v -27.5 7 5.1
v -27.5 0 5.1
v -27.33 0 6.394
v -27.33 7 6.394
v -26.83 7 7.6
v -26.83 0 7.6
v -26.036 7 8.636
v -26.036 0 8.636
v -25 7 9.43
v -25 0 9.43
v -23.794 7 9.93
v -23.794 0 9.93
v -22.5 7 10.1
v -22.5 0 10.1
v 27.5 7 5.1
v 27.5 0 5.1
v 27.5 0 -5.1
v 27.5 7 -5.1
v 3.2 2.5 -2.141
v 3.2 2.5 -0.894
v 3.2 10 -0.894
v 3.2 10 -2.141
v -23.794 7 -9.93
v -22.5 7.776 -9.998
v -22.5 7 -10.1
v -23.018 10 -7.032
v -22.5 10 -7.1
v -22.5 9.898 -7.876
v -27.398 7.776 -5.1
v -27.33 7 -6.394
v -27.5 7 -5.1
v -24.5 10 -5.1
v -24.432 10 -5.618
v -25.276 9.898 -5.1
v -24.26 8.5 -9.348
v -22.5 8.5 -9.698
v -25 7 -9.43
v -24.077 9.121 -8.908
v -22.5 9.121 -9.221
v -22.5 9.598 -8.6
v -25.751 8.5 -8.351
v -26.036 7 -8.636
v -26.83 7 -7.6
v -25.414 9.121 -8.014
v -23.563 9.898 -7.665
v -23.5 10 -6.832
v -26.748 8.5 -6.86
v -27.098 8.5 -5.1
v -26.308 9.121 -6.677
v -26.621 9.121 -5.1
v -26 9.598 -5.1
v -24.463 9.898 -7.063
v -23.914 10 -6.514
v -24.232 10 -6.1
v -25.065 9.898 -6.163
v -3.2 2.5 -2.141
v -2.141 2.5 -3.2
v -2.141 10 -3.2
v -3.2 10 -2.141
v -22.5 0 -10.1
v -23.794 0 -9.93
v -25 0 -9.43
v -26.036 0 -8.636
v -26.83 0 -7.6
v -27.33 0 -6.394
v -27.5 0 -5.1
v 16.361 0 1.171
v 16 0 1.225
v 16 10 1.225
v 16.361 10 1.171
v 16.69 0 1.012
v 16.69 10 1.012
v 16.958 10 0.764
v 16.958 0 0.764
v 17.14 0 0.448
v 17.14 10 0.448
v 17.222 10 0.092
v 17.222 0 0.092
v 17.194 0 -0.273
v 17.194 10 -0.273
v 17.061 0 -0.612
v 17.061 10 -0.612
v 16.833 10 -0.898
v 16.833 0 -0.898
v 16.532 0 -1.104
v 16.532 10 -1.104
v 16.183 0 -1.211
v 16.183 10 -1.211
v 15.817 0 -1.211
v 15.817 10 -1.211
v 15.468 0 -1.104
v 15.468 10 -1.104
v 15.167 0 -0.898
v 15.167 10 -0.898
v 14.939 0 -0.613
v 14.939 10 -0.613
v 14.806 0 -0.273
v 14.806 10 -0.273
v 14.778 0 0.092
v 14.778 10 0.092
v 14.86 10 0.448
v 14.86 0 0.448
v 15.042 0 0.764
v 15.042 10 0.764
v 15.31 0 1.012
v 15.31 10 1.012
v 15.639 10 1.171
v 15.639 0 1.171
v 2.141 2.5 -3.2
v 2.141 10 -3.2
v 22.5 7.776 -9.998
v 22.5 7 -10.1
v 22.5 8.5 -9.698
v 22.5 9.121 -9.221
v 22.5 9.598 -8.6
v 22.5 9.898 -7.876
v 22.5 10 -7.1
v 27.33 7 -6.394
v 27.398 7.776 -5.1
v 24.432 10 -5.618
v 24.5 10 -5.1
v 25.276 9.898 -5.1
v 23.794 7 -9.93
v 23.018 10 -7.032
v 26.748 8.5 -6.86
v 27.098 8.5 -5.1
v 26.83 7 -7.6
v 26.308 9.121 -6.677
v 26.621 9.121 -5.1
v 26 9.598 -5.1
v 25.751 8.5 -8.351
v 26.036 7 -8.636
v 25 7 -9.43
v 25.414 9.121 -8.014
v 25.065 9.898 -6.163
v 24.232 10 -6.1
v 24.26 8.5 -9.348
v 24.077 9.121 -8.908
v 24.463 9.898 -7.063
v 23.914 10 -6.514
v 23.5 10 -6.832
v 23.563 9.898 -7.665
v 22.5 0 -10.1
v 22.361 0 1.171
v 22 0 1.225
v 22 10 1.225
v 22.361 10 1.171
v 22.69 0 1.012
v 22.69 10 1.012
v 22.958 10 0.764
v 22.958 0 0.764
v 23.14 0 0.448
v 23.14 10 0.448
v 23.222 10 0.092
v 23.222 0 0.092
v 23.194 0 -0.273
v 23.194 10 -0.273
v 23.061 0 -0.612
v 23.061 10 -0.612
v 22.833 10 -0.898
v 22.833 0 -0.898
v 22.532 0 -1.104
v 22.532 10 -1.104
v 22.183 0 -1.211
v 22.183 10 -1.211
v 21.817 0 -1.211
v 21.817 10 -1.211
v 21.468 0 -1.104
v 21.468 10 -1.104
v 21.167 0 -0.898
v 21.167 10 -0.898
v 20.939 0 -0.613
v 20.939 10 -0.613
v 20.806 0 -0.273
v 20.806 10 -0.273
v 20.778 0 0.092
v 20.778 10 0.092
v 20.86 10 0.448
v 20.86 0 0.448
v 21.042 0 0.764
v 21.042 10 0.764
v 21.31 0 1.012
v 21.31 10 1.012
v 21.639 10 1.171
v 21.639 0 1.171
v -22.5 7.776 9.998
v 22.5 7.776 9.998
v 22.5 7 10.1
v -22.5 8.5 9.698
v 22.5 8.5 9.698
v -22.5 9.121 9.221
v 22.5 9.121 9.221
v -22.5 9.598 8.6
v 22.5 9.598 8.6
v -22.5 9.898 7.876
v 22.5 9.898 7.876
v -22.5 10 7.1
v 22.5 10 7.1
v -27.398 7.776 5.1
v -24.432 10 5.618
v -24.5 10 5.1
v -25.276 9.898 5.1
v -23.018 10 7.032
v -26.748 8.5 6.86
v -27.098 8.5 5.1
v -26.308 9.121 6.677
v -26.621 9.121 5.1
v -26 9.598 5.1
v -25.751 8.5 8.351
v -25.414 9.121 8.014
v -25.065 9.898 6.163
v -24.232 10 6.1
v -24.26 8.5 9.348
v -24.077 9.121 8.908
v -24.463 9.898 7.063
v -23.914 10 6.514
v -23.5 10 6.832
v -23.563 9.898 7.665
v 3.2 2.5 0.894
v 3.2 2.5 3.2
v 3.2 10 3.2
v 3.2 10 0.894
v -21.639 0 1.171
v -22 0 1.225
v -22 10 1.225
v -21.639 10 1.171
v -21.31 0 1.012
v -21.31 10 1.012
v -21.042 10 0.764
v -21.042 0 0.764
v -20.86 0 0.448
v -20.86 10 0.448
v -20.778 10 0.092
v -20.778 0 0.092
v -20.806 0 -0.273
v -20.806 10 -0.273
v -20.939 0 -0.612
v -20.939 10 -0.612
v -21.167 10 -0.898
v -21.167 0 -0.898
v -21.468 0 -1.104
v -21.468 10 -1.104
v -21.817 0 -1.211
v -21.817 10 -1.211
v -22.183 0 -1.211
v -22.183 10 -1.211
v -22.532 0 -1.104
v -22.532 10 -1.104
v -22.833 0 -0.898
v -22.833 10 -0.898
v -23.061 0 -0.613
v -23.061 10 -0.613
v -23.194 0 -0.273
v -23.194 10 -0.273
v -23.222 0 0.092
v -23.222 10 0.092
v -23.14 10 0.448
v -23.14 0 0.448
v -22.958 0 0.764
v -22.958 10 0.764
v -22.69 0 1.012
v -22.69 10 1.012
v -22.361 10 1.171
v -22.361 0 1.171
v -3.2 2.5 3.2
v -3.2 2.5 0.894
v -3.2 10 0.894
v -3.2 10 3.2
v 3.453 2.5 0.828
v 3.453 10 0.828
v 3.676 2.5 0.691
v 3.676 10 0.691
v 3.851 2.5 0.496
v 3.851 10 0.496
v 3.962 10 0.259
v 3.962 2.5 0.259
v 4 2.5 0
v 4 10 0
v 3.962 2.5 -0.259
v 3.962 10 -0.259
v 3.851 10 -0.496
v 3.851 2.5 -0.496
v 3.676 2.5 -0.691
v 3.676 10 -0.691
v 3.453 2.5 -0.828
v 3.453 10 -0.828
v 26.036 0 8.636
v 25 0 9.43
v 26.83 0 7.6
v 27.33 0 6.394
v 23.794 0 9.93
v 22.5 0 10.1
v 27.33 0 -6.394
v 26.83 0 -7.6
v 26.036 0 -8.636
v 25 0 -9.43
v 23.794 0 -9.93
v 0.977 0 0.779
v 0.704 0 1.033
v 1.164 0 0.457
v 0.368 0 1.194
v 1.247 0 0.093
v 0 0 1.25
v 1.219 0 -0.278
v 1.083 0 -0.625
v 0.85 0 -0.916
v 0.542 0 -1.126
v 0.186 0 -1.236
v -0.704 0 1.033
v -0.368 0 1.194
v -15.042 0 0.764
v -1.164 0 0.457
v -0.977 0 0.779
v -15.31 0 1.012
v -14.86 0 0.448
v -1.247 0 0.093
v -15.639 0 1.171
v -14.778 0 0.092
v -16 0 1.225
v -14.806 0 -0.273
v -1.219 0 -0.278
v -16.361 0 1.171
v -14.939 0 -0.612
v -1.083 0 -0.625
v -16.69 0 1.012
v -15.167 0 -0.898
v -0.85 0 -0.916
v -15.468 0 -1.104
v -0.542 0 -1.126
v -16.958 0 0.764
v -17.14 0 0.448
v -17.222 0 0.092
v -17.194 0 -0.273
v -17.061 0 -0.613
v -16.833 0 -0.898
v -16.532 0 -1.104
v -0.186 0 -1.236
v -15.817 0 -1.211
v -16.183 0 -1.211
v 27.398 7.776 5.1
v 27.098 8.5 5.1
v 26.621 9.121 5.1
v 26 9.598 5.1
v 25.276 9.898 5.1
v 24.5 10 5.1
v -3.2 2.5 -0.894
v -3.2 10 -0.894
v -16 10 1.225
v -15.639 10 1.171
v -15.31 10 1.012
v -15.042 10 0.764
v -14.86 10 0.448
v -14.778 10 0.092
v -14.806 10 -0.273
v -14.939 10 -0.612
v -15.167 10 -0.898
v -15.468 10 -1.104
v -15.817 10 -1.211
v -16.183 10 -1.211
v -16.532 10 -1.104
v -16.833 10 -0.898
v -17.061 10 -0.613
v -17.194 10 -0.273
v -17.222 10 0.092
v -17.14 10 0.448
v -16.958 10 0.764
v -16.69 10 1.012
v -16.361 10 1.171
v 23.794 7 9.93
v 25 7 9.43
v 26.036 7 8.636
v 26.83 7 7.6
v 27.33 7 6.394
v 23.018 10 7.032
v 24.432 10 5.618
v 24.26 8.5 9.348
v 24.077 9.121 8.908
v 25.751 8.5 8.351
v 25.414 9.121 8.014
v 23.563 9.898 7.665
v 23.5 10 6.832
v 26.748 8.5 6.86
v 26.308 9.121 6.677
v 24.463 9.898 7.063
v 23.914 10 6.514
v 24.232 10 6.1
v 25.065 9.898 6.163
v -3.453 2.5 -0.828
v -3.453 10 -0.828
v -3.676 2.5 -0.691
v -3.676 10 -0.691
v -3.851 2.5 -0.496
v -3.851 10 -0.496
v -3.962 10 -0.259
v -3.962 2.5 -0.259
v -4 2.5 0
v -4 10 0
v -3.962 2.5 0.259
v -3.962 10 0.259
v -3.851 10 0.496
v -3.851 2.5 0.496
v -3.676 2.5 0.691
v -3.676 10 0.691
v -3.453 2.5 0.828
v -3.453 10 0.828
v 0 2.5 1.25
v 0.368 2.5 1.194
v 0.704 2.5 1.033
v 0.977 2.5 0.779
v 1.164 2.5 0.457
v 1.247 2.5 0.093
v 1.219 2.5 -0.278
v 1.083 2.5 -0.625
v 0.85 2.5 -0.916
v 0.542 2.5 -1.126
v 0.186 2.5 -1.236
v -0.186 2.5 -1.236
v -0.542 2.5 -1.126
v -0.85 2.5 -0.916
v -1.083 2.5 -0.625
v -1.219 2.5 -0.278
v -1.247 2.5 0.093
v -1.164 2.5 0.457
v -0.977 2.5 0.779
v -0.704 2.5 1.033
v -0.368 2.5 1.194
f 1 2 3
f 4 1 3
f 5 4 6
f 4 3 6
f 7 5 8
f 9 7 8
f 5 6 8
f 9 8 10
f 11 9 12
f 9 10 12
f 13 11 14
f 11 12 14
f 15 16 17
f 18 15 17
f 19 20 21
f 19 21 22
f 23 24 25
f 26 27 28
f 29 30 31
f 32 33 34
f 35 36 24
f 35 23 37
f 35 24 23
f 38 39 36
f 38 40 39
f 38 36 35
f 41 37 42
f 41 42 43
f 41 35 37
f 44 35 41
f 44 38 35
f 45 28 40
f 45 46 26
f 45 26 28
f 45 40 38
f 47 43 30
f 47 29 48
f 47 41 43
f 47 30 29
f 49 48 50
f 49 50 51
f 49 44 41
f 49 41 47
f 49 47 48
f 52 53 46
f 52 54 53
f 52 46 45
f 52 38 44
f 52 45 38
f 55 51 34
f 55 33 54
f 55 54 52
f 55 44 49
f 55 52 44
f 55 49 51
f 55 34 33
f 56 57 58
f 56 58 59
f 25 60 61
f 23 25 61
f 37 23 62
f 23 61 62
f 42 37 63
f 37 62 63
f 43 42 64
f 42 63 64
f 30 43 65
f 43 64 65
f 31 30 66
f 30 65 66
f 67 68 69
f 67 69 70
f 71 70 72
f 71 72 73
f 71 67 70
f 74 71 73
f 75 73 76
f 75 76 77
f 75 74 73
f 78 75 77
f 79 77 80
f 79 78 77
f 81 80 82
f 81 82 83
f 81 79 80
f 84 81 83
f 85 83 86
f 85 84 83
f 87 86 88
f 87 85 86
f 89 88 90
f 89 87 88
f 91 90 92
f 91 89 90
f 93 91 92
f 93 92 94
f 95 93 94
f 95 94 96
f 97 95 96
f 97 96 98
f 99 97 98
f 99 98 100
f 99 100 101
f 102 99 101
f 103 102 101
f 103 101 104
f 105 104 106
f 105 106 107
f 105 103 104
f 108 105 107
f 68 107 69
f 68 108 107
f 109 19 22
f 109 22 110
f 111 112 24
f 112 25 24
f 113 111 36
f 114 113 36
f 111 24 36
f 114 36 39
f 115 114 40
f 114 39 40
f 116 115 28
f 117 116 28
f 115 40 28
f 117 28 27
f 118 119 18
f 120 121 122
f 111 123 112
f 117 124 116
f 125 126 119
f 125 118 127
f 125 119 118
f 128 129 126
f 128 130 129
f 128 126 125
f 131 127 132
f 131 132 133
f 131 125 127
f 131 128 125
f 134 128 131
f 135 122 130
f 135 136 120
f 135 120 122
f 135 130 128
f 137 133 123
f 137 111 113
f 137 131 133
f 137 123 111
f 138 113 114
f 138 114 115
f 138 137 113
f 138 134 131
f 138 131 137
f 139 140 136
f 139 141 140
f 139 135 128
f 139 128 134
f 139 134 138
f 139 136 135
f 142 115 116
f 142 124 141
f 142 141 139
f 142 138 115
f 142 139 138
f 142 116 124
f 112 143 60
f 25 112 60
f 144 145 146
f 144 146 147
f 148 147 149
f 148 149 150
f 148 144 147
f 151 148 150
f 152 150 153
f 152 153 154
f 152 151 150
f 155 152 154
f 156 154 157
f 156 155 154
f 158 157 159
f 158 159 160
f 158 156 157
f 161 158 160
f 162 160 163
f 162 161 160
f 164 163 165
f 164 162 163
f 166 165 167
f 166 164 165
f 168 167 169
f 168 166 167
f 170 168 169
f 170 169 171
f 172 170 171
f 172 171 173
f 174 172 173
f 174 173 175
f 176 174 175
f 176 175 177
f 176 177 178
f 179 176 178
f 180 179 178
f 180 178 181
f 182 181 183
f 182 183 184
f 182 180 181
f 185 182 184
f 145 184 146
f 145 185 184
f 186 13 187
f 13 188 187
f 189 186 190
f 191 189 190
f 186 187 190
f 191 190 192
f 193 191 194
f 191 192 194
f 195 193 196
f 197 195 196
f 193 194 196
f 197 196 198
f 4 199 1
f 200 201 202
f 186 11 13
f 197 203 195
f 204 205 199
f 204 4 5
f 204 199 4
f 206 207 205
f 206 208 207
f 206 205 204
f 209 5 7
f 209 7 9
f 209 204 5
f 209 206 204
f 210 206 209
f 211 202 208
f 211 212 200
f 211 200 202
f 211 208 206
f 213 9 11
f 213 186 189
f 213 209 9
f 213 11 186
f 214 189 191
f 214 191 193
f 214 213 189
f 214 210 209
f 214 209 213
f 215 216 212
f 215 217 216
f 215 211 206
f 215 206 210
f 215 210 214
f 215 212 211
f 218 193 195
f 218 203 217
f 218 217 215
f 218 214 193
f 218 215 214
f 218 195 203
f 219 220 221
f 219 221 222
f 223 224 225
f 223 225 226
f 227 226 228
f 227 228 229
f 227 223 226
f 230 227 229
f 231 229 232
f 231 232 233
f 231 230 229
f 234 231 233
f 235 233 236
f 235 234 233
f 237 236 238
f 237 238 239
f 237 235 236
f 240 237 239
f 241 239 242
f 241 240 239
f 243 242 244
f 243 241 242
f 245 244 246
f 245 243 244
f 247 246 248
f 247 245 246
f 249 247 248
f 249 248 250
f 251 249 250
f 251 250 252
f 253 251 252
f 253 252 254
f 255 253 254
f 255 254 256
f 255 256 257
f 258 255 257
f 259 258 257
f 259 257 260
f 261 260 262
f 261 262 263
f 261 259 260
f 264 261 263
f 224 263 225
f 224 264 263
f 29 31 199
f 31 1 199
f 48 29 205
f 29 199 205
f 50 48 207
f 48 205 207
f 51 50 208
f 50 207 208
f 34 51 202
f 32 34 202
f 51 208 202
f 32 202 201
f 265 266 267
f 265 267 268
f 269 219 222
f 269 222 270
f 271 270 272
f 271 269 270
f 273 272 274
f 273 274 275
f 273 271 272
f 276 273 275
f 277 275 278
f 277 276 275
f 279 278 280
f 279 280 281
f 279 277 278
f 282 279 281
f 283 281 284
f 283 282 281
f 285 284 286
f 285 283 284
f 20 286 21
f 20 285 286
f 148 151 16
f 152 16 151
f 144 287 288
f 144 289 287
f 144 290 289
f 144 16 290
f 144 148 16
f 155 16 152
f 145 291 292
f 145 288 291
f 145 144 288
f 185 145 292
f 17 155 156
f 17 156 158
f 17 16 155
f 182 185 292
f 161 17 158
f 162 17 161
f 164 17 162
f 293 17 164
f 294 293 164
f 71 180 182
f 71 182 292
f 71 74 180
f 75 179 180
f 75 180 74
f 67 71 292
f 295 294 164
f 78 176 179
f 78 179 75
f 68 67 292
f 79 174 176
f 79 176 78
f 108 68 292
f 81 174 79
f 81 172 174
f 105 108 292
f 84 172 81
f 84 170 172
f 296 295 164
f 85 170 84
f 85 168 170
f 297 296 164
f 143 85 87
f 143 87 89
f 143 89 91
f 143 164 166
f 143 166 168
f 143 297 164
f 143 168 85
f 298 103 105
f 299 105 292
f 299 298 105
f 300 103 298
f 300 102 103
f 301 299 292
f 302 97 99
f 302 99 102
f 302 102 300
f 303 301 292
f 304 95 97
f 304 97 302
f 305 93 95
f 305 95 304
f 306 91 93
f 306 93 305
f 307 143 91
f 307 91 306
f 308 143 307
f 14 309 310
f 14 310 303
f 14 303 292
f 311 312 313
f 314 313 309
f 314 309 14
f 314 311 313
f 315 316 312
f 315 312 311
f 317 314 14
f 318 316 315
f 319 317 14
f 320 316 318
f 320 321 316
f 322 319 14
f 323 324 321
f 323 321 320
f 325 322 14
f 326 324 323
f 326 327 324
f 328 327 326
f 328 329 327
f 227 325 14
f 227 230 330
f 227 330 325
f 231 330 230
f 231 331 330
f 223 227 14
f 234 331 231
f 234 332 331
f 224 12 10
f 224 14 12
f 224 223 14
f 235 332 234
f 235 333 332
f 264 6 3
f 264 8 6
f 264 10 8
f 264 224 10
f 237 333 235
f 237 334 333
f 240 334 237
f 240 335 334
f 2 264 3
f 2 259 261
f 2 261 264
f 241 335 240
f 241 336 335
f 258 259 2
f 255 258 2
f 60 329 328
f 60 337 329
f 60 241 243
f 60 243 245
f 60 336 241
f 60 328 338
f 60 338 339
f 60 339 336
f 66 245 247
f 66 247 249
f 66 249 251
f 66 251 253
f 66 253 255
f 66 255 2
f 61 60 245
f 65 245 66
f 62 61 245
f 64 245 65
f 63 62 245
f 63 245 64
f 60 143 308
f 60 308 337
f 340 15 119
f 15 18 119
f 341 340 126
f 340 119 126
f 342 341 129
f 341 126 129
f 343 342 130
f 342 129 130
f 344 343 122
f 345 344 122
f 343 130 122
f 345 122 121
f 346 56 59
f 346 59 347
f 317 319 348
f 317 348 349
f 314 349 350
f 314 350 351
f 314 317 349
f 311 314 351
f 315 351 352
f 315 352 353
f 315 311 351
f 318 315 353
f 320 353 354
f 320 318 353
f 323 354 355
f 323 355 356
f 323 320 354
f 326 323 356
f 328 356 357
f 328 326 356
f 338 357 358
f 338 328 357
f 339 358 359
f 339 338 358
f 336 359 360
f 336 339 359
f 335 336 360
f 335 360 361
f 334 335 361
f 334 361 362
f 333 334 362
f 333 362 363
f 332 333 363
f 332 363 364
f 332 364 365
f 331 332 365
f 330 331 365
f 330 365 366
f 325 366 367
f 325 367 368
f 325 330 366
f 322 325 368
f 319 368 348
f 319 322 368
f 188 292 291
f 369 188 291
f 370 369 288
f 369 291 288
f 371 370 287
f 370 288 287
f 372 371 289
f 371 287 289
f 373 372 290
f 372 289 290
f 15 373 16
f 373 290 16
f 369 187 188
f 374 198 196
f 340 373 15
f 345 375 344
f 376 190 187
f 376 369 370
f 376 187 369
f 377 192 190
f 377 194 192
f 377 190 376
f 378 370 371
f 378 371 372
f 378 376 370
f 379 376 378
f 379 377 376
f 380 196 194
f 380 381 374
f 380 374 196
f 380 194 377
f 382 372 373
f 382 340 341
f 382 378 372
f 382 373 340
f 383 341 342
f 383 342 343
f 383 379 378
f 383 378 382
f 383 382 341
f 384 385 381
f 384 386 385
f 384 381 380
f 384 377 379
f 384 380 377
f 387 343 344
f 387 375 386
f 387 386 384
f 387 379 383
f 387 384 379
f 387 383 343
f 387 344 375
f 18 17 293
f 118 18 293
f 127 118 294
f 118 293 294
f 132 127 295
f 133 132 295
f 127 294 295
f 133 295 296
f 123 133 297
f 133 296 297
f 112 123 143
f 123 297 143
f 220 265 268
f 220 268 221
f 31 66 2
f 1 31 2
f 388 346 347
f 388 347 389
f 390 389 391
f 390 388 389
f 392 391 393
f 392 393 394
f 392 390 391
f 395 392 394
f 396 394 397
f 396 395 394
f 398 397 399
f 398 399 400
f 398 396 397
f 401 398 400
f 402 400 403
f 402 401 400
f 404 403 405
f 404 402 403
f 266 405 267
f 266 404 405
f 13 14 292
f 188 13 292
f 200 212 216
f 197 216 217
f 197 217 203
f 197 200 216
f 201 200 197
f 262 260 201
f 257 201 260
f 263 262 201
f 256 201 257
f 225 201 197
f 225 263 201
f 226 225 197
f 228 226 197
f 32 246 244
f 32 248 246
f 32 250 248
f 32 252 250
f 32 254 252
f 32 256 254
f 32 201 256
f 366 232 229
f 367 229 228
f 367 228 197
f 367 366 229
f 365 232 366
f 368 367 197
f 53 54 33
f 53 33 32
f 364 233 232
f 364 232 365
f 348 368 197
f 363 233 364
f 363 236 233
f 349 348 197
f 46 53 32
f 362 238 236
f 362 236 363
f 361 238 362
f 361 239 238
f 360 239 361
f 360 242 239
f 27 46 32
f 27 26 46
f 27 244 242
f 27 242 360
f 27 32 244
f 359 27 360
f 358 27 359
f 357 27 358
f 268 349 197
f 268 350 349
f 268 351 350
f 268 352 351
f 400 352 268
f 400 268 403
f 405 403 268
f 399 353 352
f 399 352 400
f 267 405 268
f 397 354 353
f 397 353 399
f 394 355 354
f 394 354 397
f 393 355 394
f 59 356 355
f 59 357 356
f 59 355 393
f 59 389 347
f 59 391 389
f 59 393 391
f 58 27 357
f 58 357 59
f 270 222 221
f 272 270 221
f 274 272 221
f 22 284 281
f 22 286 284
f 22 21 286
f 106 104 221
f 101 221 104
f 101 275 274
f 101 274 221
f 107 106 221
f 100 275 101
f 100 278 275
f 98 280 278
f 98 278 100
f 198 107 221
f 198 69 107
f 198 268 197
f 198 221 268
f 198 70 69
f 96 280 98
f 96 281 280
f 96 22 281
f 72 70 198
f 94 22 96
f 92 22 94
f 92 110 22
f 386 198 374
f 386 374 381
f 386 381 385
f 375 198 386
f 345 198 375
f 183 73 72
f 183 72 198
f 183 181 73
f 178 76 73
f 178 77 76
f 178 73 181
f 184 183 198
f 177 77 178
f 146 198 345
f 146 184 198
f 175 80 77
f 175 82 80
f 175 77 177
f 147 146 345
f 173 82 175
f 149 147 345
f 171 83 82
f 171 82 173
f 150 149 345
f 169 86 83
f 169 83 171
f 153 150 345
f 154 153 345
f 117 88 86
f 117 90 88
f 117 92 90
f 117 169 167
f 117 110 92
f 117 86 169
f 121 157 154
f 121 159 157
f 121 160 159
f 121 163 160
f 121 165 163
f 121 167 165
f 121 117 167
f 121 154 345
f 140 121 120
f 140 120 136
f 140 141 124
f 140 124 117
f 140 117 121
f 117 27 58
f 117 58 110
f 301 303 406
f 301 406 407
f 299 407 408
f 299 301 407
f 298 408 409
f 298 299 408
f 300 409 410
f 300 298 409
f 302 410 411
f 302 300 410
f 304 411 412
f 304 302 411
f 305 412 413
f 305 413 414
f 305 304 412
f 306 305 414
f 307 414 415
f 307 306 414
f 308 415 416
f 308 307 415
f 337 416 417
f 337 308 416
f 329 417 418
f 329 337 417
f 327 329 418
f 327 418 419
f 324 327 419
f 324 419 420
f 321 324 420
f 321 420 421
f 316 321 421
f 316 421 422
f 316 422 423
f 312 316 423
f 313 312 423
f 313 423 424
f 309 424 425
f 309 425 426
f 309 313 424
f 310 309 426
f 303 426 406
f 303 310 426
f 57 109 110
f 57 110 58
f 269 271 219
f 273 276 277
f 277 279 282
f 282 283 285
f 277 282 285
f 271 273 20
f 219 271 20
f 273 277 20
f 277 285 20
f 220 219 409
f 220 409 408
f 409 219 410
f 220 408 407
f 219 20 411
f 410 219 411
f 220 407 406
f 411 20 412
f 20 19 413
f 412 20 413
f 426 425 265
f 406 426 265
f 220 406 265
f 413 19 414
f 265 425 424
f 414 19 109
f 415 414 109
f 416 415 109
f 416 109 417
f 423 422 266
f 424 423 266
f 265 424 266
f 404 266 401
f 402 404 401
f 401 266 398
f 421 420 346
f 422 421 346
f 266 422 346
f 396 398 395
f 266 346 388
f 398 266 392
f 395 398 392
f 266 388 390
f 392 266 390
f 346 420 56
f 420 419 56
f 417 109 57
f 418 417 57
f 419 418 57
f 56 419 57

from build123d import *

# Parameters (mm, degrees)
SKETCH_1_R      = 1.225
EXTRUDE_1_DEPTH = 10
SKETCH_1_7_R    = 1.25
EXTRUDE_2_DEPTH = 2.5
FILLET_1_R      = 3


with BuildPart() as part:
    # 草图1 → 凸台-拉伸1 (new body)
    with BuildSketch(Plane(origin=(0, 0, 0), x_dir=(1, 0, 0), z_dir=(0, 1, 0))):
        with BuildLine():
            ThreePointArc((-22.5, 10.1), (-26.035533906, 8.635533906), (-27.5, 5.1))
            Line((-27.5, 5.1), (-27.5, -5.1))
            ThreePointArc((-27.5, -5.1), (-26.035533906, -8.635533906), (-22.5, -10.1))
            Line((-22.5, -10.1), (22.5, -10.1))
            ThreePointArc((22.5, -10.1), (26.035533906, -8.635533906), (27.5, -5.1))
            Line((27.5, -5.1), (27.5, 5.1))
            ThreePointArc((27.5, 5.1), (26.035533906, 8.635533906), (22.5, 10.1))
            Line((22.5, 10.1), (-22.5, 10.1))
        make_face()
        with Locations((-22, 0)):
            Circle(SKETCH_1_R, mode=Mode.SUBTRACT)
        with Locations((-16, 0)):
            Circle(SKETCH_1_R, mode=Mode.SUBTRACT)
        with BuildLine():
            Line((3.2, -3.2), (-3.2, -3.2))
            Line((-3.2, -3.2), (-3.2, -0.894427191))
            ThreePointArc((-3.2, -0.894427191), (-4, 0), (-3.2, 0.894427191))
            Line((-3.2, 0.894427191), (-3.2, 2.141421356))
            Line((-3.2, 2.141421356), (-2.141421356, 3.2))
            Line((-2.141421356, 3.2), (2.141421356, 3.2))
            Line((2.141421356, 3.2), (3.2, 2.141421356))
            Line((3.2, 2.141421356), (3.2, 0.894427191))
            ThreePointArc((3.2, 0.894427191), (4, 0), (3.2, -0.894427191))
            Line((3.2, -0.894427191), (3.2, -3.2))
        make_face(mode=Mode.SUBTRACT)
        with Locations((16, 0)):
            Circle(SKETCH_1_R, mode=Mode.SUBTRACT)
        with Locations((22, 0)):
            Circle(SKETCH_1_R, mode=Mode.SUBTRACT)
    extrude(amount=EXTRUDE_1_DEPTH)

    # 草图1<7> → 凸台-拉伸2 (add)
    with BuildSketch(Plane(origin=(0, 0, 0), x_dir=(1, 0, 0), z_dir=(0, 1, 0))):
        with BuildLine():
            Line((-3.2, -0.894427191), (-3.2, -3.2))
            Line((-3.2, -3.2), (3.2, -3.2))
            Line((3.2, -3.2), (3.2, -0.894427191))
            ThreePointArc((3.2, -0.894427191), (4, 0), (3.2, 0.894427191))
            Line((3.2, 0.894427191), (3.2, 2.141421356))
            Line((3.2, 2.141421356), (2.141421356, 3.2))
            Line((2.141421356, 3.2), (-2.141421356, 3.2))
            Line((-2.141421356, 3.2), (-3.2, 2.141421356))
            Line((-3.2, 2.141421356), (-3.2, 0.894427191))
            ThreePointArc((-3.2, 0.894427191), (-4, 0), (-3.2, -0.894427191))
        make_face()
        Circle(SKETCH_1_7_R, mode=Mode.SUBTRACT)
    extrude(amount=EXTRUDE_2_DEPTH)

    # 圆角1
    fillet_1_edges = [part.edges().sort_by_distance(p)[0] for p in [
        (-26.035533906, 10, 8.635533906),
        (-26.035533906, 10, -8.635533906),
        (26.035533906, 10, -8.635533906),
        (26.035533906, 10, 8.635533906),
        (-27.5, 10, 0),
        (27.5, 10, 0),
        (0, 10, -10.1),
        (0, 10, 10.1),
    ]]
    fillet(fillet_1_edges, radius=FILLET_1_R)


solid = part.part
